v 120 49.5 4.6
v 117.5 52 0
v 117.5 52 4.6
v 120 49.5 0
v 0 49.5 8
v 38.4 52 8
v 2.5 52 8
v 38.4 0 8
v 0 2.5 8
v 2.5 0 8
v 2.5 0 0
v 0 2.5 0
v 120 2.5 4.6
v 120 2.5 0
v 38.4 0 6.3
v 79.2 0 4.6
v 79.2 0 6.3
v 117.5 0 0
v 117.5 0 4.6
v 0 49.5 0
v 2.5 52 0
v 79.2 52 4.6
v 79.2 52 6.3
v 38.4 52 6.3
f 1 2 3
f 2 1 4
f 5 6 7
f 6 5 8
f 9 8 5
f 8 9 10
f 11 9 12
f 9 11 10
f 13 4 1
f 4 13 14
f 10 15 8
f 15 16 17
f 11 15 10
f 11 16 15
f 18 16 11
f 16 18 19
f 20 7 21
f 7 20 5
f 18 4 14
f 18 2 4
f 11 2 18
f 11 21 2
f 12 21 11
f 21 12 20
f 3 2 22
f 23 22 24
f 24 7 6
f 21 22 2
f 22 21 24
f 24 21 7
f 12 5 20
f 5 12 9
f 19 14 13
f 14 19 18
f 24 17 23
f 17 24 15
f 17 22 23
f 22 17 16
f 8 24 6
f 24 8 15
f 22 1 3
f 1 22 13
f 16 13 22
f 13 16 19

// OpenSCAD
$fn = 32;

// ----------------------------------------------------------------------
// Stepped bar: twostep, 120 x 52 x 8/4.6 mm
// ----------------------------------------------------------------------

// --- parameters (mm) ---
bar_l = 120;              // bar length, X
bar_w = 52;               // bar width, Y
plate_t = 8;              // thickness of the thick zone, Z
thin_t = 4.6;             // thickness of the thin zone
corner_c = 2.5;           // corner chamfer of the bar
step_cut = 3.4;           // material removed from the thin zone
stair1_x = 38.4;          // position of the first stair
stair2_x = 79.2;          // position of the second stair
mid_t = 6.3;              // thickness of the middle zone
depth_1 = 1.7;            // depth of cut 1 from the top face
depth_2 = 3.4;            // depth of cut 2 from the top face

profile = [[2.5, 0], [117.5, 0], [120, 2.5], [120, 49.5], [117.5, 52], [2.5, 52], [0, 49.5], [0, 2.5]];  // primary outline, 8 points, counter clockwise
void_1 = [[38.4, -1], [79.2, -1], [79.2, 53], [38.4, 53]];  // first stair, 4 points
void_2 = [[79.2, -1], [121, -1], [121, 53], [79.2, 53]];  // second stair, 4 points

// --- the one profile operation ---
difference() {
  linear_extrude(height = plate_t) polygon(points = profile);
  translate([0, 0, plate_t - depth_1])
    linear_extrude(height = depth_1 + 1) polygon(points = void_1);
  translate([0, 0, plate_t - depth_2])
    linear_extrude(height = depth_2 + 1) polygon(points = void_2);
}
